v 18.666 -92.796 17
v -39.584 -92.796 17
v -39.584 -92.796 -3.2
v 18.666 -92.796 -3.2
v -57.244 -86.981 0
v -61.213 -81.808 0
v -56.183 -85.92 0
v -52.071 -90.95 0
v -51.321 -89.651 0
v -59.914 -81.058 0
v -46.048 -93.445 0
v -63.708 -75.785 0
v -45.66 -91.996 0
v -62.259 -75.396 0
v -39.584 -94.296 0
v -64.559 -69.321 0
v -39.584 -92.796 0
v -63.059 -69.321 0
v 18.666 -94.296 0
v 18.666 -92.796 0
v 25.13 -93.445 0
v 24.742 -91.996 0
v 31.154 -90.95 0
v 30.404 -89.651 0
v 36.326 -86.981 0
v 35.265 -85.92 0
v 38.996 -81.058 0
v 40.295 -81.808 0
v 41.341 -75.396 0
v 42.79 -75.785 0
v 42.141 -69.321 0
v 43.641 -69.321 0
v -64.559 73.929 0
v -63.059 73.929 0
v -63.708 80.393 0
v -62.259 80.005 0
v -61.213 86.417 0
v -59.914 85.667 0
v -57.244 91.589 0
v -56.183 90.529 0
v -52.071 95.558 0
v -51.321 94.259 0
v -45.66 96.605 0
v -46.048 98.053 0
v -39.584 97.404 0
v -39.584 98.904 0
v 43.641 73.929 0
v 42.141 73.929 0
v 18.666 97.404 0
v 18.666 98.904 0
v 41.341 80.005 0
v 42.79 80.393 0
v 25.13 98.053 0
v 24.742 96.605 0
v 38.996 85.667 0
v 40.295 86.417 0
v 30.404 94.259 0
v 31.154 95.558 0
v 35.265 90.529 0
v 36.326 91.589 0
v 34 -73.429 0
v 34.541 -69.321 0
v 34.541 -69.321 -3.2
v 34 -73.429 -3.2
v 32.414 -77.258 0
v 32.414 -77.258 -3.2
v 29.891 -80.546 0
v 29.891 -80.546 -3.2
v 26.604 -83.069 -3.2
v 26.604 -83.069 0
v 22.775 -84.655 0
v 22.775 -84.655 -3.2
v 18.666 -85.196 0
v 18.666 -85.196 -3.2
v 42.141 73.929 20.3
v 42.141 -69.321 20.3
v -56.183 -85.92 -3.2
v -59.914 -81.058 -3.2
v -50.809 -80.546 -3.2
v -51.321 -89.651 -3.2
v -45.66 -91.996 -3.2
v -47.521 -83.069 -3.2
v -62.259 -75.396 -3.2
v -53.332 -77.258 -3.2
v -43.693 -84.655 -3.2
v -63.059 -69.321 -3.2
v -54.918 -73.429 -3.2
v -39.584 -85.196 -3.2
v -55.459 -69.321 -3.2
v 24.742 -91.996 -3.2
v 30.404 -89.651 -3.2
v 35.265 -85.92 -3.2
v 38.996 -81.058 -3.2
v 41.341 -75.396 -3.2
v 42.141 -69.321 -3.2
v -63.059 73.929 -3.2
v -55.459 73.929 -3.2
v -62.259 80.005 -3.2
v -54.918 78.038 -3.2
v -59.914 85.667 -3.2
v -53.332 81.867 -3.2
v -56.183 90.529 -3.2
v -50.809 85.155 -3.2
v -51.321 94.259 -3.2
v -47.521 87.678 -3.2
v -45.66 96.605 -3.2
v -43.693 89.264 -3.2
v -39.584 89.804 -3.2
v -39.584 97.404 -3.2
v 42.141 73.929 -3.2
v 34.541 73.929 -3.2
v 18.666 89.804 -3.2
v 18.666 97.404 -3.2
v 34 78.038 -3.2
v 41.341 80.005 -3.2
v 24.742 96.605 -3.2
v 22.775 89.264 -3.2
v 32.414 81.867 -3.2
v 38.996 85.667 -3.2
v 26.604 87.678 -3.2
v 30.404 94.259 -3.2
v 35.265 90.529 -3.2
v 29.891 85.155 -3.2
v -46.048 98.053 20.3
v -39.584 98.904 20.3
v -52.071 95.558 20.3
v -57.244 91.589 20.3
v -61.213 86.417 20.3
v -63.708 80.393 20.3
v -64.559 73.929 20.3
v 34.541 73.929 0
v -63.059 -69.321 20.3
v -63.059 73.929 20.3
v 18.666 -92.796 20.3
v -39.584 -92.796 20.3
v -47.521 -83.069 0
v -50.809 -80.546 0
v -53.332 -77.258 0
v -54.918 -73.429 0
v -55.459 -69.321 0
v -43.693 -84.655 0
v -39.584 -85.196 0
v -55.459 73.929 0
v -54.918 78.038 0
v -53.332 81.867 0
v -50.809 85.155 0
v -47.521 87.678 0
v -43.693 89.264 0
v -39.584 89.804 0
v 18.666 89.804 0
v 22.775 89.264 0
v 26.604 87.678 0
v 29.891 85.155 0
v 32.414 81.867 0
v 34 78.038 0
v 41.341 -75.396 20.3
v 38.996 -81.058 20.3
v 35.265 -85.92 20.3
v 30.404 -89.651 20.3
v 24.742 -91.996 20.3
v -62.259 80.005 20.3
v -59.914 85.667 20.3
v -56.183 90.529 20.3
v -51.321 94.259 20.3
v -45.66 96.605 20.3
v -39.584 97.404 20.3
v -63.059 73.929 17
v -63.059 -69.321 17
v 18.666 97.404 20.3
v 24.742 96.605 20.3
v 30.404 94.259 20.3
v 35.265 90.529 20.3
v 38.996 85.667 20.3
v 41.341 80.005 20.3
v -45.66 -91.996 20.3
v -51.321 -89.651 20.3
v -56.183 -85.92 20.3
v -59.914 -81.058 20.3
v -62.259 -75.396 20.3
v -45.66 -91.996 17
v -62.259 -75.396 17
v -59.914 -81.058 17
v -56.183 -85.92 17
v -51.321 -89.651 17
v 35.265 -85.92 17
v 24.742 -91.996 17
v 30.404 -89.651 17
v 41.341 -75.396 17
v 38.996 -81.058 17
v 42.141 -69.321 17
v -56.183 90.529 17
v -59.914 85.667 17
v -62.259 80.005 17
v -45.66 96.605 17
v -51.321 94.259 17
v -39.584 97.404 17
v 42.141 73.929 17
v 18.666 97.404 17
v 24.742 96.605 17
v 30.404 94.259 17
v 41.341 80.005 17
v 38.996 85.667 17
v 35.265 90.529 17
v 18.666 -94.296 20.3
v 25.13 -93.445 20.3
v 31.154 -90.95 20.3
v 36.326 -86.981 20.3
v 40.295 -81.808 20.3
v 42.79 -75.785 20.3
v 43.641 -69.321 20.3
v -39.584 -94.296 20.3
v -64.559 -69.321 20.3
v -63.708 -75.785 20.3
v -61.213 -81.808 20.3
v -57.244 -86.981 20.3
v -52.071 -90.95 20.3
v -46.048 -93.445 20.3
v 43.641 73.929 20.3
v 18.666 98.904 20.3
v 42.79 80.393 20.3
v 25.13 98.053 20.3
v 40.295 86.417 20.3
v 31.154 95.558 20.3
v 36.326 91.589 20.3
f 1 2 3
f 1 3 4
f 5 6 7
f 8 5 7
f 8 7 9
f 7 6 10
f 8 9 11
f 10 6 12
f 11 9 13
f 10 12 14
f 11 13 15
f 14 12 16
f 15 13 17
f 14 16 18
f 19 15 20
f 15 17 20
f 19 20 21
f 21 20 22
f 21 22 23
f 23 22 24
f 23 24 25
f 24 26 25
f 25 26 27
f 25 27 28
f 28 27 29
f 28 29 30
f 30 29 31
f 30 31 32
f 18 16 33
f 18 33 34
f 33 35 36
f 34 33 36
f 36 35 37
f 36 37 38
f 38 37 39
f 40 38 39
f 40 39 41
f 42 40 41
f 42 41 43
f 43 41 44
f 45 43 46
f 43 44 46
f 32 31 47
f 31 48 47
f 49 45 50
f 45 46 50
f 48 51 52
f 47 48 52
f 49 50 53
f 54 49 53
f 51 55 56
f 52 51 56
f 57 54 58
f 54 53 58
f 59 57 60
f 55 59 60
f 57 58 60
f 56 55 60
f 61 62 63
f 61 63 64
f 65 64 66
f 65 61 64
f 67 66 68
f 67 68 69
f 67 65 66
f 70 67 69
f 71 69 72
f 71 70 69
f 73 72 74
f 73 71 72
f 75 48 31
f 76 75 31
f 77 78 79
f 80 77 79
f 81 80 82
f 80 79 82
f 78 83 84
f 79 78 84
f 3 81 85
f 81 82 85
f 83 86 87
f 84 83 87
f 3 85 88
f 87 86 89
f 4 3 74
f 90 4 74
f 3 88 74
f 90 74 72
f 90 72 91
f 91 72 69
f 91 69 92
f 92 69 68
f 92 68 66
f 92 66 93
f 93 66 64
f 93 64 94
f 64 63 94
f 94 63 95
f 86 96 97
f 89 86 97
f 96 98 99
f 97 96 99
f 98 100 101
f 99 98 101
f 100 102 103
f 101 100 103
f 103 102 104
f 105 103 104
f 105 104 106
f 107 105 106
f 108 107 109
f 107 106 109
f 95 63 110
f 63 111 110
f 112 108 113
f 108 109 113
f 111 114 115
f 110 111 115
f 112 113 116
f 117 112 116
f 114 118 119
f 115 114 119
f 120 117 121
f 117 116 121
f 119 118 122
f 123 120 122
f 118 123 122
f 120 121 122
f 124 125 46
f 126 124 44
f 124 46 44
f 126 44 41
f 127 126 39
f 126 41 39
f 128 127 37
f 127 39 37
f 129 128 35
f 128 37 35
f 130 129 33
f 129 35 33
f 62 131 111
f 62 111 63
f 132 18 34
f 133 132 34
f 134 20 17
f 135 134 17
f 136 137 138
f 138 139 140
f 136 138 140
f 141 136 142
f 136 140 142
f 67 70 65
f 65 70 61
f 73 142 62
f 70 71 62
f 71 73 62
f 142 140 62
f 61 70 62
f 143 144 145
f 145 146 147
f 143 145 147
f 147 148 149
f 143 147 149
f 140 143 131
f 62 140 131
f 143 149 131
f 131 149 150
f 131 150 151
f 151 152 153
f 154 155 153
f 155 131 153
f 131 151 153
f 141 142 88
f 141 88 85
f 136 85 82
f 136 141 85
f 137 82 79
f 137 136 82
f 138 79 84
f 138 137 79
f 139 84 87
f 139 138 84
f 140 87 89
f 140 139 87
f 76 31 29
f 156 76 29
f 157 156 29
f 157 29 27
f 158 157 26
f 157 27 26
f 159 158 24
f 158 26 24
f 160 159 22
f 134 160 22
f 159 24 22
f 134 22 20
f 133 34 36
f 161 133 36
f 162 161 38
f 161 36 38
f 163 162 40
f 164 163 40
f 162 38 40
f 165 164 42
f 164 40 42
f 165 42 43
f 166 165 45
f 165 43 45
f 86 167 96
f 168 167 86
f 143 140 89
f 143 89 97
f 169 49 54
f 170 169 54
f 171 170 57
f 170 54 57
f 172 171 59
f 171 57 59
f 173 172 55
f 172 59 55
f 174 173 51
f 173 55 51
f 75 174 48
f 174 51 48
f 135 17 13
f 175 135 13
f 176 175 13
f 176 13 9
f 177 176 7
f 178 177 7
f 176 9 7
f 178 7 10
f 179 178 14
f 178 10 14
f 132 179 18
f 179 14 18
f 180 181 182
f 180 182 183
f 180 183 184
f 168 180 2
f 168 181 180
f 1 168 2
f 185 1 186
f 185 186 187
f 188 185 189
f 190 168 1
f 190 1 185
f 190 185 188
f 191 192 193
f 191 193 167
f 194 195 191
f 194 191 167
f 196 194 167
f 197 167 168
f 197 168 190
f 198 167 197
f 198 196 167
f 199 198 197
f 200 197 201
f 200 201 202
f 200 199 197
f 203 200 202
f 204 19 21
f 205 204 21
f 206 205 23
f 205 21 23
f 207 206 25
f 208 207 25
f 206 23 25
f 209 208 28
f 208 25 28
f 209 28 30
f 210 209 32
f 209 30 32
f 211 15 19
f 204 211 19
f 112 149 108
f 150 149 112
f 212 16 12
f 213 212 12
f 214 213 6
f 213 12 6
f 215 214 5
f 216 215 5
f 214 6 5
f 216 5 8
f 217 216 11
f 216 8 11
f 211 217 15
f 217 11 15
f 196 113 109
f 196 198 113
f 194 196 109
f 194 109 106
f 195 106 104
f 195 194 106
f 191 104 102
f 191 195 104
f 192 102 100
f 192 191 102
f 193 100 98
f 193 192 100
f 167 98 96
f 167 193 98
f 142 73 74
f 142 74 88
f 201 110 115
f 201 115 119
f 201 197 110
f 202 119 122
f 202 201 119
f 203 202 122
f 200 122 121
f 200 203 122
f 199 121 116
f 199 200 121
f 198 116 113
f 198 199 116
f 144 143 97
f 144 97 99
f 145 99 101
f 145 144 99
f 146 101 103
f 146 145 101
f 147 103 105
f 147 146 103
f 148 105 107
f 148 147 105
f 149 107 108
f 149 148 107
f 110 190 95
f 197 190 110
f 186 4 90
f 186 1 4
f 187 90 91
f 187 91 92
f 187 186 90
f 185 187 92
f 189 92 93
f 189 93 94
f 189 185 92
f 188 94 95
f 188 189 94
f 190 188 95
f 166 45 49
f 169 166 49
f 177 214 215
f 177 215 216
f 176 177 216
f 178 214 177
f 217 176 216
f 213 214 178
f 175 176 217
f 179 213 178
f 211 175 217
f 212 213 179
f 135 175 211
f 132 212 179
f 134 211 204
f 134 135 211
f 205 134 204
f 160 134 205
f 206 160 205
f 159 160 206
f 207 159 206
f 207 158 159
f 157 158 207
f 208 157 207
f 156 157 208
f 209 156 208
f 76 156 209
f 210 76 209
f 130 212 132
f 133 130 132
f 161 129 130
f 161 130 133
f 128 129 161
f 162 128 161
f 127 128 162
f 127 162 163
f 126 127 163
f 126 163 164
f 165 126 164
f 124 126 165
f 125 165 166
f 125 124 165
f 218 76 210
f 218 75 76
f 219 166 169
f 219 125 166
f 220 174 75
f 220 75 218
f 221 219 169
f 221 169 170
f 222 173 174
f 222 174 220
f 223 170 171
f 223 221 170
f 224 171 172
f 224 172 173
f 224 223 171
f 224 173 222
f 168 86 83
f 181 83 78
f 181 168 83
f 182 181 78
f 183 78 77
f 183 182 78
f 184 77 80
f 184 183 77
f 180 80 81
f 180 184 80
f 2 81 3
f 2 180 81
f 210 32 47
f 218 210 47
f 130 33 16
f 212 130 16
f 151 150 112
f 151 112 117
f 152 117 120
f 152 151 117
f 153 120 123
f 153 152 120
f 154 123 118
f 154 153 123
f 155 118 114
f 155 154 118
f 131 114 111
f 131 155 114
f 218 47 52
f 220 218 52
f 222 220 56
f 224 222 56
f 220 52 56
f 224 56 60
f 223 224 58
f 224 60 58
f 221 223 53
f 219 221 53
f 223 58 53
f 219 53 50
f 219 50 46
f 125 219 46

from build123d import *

# Parameters (mm, degrees)
F1_DEPTH = 17
F2_DEPTH = 3.2
F3_DEPTH = 20.3


with BuildPart() as f1:
    # F0 (on Top) → F1 (new body)
    with BuildSketch(Plane.XY):
        with BuildLine():
            Line((18.6661011875, 97.4044347763), (-39.5838988125, 97.4044347763))
            ThreePointArc((-39.5838988125, 97.4044347763), (-56.1832305009, 90.5287664647), (-63.0588988125, 73.9294347763))
            Line((-63.0588988125, 73.9294347763), (-63.0588988125, -69.3205652237))
            ThreePointArc((-63.0588988125, -69.3205652237), (-56.1832305009, -85.919896912), (-39.5838988125, -92.7955652237))
            Line((-39.5838988125, -92.7955652237), (18.6661011875, -92.7955652237))
            ThreePointArc((18.6661011875, -92.7955652237), (35.2654328758, -85.919896912), (42.1411011875, -69.3205652237))
            Line((42.1411011875, -69.3205652237), (42.1411011875, 73.9294347763))
            ThreePointArc((42.1411011875, 73.9294347763), (35.2654328758, 90.5287664647), (18.6661011875, 97.4044347763))
        make_face()
        with BuildLine():
            ThreePointArc((-55.4588988125, 73.9294347763), (-50.8092189639, 85.1547549276), (-39.5838988125, 89.8044347763))
            Line((-39.5838988125, 89.8044347763), (18.6661011875, 89.8044347763))
            ThreePointArc((18.6661011875, 89.8044347763), (29.8914213388, 85.1547549276), (34.5411011875, 73.9294347763))
            Line((34.5411011875, 73.9294347763), (34.5411011875, -69.3205652237))
            ThreePointArc((34.5411011875, -69.3205652237), (29.8914213388, -80.545885375), (18.6661011875, -85.1955652237))
            Line((18.6661011875, -85.1955652237), (-39.5838988125, -85.1955652237))
            ThreePointArc((-39.5838988125, -85.1955652237), (-50.8092189639, -80.545885375), (-55.4588988125, -69.3205652237))
            Line((-55.4588988125, -69.3205652237), (-55.4588988125, 73.9294347763))
        make_face(mode=Mode.SUBTRACT)
        with BuildLine():
            Line((18.6661011875, 89.8044347763), (-39.5838988125, 89.8044347763))
            ThreePointArc((-39.5838988125, 89.8044347763), (-50.8092189639, 85.1547549276), (-55.4588988125, 73.9294347763))
            Line((-55.4588988125, 73.9294347763), (-55.4588988125, -69.3205652237))
            ThreePointArc((-55.4588988125, -69.3205652237), (-50.8092189639, -80.545885375), (-39.5838988125, -85.1955652237))
            Line((-39.5838988125, -85.1955652237), (18.6661011875, -85.1955652237))
            ThreePointArc((18.6661011875, -85.1955652237), (29.8914213388, -80.545885375), (34.5411011875, -69.3205652237))
            Line((34.5411011875, -69.3205652237), (34.5411011875, 73.9294347763))
            ThreePointArc((34.5411011875, 73.9294347763), (29.8914213388, 85.1547549276), (18.6661011875, 89.8044347763))
        make_face()
    extrude(amount=F1_DEPTH)

    # F0 (on Top) → F2 (join)
    with BuildSketch(Plane.XY):
        with BuildLine():
            Line((18.6661011875, 97.4044347763), (-39.5838988125, 97.4044347763))
            ThreePointArc((-39.5838988125, 97.4044347763), (-56.1832305009, 90.5287664647), (-63.0588988125, 73.9294347763))
            Line((-63.0588988125, 73.9294347763), (-63.0588988125, -69.3205652237))
            ThreePointArc((-63.0588988125, -69.3205652237), (-56.1832305009, -85.919896912), (-39.5838988125, -92.7955652237))
            Line((-39.5838988125, -92.7955652237), (18.6661011875, -92.7955652237))
            ThreePointArc((18.6661011875, -92.7955652237), (35.2654328758, -85.919896912), (42.1411011875, -69.3205652237))
            Line((42.1411011875, -69.3205652237), (42.1411011875, 73.9294347763))
            ThreePointArc((42.1411011875, 73.9294347763), (35.2654328758, 90.5287664647), (18.6661011875, 97.4044347763))
        make_face()
        with BuildLine():
            ThreePointArc((-55.4588988125, 73.9294347763), (-50.8092189639, 85.1547549276), (-39.5838988125, 89.8044347763))
            Line((-39.5838988125, 89.8044347763), (18.6661011875, 89.8044347763))
            ThreePointArc((18.6661011875, 89.8044347763), (29.8914213388, 85.1547549276), (34.5411011875, 73.9294347763))
            Line((34.5411011875, 73.9294347763), (34.5411011875, -69.3205652237))
            ThreePointArc((34.5411011875, -69.3205652237), (29.8914213388, -80.545885375), (18.6661011875, -85.1955652237))
            Line((18.6661011875, -85.1955652237), (-39.5838988125, -85.1955652237))
            ThreePointArc((-39.5838988125, -85.1955652237), (-50.8092189639, -80.545885375), (-55.4588988125, -69.3205652237))
            Line((-55.4588988125, -69.3205652237), (-55.4588988125, 73.9294347763))
        make_face(mode=Mode.SUBTRACT)
    extrude(amount=-F2_DEPTH)


with BuildPart() as f3:
    # F0 (on Top) → F3 (new body)
    with BuildSketch(Plane.XY):
        with BuildLine():
            Line((18.6661011875, 98.9044347763), (-39.5838988125, 98.9044347763))
            ThreePointArc((-39.5838988125, 98.9044347763), (-57.2438906727, 91.5894266364), (-64.5588988125, 73.9294347763))
            Line((-64.5588988125, 73.9294347763), (-64.5588988125, -69.3205652237))
            ThreePointArc((-64.5588988125, -69.3205652237), (-57.2438906727, -86.9805570838), (-39.5838988125, -94.2955652237))
            Line((-39.5838988125, -94.2955652237), (18.6661011875, -94.2955652237))
            ThreePointArc((18.6661011875, -94.2955652237), (36.3260930476, -86.9805570838), (43.6411011875, -69.3205652237))
            Line((43.6411011875, -69.3205652237), (43.6411011875, 73.9294347763))
            ThreePointArc((43.6411011875, 73.9294347763), (36.3260930476, 91.5894266364), (18.6661011875, 98.9044347763))
        make_face()
        with BuildLine():
            ThreePointArc((-63.0588988125, 73.9294347763), (-56.1832305009, 90.5287664647), (-39.5838988125, 97.4044347763))
            Line((-39.5838988125, 97.4044347763), (18.6661011875, 97.4044347763))
            ThreePointArc((18.6661011875, 97.4044347763), (35.2654328758, 90.5287664647), (42.1411011875, 73.9294347763))
            Line((42.1411011875, 73.9294347763), (42.1411011875, -69.3205652237))
            ThreePointArc((42.1411011875, -69.3205652237), (35.2654328758, -85.919896912), (18.6661011875, -92.7955652237))
            Line((18.6661011875, -92.7955652237), (-39.5838988125, -92.7955652237))
            ThreePointArc((-39.5838988125, -92.7955652237), (-56.1832305009, -85.919896912), (-63.0588988125, -69.3205652237))
            Line((-63.0588988125, -69.3205652237), (-63.0588988125, 73.9294347763))
        make_face(mode=Mode.SUBTRACT)
    extrude(amount=F3_DEPTH)


solid = Compound([f1.part, f3.part])
